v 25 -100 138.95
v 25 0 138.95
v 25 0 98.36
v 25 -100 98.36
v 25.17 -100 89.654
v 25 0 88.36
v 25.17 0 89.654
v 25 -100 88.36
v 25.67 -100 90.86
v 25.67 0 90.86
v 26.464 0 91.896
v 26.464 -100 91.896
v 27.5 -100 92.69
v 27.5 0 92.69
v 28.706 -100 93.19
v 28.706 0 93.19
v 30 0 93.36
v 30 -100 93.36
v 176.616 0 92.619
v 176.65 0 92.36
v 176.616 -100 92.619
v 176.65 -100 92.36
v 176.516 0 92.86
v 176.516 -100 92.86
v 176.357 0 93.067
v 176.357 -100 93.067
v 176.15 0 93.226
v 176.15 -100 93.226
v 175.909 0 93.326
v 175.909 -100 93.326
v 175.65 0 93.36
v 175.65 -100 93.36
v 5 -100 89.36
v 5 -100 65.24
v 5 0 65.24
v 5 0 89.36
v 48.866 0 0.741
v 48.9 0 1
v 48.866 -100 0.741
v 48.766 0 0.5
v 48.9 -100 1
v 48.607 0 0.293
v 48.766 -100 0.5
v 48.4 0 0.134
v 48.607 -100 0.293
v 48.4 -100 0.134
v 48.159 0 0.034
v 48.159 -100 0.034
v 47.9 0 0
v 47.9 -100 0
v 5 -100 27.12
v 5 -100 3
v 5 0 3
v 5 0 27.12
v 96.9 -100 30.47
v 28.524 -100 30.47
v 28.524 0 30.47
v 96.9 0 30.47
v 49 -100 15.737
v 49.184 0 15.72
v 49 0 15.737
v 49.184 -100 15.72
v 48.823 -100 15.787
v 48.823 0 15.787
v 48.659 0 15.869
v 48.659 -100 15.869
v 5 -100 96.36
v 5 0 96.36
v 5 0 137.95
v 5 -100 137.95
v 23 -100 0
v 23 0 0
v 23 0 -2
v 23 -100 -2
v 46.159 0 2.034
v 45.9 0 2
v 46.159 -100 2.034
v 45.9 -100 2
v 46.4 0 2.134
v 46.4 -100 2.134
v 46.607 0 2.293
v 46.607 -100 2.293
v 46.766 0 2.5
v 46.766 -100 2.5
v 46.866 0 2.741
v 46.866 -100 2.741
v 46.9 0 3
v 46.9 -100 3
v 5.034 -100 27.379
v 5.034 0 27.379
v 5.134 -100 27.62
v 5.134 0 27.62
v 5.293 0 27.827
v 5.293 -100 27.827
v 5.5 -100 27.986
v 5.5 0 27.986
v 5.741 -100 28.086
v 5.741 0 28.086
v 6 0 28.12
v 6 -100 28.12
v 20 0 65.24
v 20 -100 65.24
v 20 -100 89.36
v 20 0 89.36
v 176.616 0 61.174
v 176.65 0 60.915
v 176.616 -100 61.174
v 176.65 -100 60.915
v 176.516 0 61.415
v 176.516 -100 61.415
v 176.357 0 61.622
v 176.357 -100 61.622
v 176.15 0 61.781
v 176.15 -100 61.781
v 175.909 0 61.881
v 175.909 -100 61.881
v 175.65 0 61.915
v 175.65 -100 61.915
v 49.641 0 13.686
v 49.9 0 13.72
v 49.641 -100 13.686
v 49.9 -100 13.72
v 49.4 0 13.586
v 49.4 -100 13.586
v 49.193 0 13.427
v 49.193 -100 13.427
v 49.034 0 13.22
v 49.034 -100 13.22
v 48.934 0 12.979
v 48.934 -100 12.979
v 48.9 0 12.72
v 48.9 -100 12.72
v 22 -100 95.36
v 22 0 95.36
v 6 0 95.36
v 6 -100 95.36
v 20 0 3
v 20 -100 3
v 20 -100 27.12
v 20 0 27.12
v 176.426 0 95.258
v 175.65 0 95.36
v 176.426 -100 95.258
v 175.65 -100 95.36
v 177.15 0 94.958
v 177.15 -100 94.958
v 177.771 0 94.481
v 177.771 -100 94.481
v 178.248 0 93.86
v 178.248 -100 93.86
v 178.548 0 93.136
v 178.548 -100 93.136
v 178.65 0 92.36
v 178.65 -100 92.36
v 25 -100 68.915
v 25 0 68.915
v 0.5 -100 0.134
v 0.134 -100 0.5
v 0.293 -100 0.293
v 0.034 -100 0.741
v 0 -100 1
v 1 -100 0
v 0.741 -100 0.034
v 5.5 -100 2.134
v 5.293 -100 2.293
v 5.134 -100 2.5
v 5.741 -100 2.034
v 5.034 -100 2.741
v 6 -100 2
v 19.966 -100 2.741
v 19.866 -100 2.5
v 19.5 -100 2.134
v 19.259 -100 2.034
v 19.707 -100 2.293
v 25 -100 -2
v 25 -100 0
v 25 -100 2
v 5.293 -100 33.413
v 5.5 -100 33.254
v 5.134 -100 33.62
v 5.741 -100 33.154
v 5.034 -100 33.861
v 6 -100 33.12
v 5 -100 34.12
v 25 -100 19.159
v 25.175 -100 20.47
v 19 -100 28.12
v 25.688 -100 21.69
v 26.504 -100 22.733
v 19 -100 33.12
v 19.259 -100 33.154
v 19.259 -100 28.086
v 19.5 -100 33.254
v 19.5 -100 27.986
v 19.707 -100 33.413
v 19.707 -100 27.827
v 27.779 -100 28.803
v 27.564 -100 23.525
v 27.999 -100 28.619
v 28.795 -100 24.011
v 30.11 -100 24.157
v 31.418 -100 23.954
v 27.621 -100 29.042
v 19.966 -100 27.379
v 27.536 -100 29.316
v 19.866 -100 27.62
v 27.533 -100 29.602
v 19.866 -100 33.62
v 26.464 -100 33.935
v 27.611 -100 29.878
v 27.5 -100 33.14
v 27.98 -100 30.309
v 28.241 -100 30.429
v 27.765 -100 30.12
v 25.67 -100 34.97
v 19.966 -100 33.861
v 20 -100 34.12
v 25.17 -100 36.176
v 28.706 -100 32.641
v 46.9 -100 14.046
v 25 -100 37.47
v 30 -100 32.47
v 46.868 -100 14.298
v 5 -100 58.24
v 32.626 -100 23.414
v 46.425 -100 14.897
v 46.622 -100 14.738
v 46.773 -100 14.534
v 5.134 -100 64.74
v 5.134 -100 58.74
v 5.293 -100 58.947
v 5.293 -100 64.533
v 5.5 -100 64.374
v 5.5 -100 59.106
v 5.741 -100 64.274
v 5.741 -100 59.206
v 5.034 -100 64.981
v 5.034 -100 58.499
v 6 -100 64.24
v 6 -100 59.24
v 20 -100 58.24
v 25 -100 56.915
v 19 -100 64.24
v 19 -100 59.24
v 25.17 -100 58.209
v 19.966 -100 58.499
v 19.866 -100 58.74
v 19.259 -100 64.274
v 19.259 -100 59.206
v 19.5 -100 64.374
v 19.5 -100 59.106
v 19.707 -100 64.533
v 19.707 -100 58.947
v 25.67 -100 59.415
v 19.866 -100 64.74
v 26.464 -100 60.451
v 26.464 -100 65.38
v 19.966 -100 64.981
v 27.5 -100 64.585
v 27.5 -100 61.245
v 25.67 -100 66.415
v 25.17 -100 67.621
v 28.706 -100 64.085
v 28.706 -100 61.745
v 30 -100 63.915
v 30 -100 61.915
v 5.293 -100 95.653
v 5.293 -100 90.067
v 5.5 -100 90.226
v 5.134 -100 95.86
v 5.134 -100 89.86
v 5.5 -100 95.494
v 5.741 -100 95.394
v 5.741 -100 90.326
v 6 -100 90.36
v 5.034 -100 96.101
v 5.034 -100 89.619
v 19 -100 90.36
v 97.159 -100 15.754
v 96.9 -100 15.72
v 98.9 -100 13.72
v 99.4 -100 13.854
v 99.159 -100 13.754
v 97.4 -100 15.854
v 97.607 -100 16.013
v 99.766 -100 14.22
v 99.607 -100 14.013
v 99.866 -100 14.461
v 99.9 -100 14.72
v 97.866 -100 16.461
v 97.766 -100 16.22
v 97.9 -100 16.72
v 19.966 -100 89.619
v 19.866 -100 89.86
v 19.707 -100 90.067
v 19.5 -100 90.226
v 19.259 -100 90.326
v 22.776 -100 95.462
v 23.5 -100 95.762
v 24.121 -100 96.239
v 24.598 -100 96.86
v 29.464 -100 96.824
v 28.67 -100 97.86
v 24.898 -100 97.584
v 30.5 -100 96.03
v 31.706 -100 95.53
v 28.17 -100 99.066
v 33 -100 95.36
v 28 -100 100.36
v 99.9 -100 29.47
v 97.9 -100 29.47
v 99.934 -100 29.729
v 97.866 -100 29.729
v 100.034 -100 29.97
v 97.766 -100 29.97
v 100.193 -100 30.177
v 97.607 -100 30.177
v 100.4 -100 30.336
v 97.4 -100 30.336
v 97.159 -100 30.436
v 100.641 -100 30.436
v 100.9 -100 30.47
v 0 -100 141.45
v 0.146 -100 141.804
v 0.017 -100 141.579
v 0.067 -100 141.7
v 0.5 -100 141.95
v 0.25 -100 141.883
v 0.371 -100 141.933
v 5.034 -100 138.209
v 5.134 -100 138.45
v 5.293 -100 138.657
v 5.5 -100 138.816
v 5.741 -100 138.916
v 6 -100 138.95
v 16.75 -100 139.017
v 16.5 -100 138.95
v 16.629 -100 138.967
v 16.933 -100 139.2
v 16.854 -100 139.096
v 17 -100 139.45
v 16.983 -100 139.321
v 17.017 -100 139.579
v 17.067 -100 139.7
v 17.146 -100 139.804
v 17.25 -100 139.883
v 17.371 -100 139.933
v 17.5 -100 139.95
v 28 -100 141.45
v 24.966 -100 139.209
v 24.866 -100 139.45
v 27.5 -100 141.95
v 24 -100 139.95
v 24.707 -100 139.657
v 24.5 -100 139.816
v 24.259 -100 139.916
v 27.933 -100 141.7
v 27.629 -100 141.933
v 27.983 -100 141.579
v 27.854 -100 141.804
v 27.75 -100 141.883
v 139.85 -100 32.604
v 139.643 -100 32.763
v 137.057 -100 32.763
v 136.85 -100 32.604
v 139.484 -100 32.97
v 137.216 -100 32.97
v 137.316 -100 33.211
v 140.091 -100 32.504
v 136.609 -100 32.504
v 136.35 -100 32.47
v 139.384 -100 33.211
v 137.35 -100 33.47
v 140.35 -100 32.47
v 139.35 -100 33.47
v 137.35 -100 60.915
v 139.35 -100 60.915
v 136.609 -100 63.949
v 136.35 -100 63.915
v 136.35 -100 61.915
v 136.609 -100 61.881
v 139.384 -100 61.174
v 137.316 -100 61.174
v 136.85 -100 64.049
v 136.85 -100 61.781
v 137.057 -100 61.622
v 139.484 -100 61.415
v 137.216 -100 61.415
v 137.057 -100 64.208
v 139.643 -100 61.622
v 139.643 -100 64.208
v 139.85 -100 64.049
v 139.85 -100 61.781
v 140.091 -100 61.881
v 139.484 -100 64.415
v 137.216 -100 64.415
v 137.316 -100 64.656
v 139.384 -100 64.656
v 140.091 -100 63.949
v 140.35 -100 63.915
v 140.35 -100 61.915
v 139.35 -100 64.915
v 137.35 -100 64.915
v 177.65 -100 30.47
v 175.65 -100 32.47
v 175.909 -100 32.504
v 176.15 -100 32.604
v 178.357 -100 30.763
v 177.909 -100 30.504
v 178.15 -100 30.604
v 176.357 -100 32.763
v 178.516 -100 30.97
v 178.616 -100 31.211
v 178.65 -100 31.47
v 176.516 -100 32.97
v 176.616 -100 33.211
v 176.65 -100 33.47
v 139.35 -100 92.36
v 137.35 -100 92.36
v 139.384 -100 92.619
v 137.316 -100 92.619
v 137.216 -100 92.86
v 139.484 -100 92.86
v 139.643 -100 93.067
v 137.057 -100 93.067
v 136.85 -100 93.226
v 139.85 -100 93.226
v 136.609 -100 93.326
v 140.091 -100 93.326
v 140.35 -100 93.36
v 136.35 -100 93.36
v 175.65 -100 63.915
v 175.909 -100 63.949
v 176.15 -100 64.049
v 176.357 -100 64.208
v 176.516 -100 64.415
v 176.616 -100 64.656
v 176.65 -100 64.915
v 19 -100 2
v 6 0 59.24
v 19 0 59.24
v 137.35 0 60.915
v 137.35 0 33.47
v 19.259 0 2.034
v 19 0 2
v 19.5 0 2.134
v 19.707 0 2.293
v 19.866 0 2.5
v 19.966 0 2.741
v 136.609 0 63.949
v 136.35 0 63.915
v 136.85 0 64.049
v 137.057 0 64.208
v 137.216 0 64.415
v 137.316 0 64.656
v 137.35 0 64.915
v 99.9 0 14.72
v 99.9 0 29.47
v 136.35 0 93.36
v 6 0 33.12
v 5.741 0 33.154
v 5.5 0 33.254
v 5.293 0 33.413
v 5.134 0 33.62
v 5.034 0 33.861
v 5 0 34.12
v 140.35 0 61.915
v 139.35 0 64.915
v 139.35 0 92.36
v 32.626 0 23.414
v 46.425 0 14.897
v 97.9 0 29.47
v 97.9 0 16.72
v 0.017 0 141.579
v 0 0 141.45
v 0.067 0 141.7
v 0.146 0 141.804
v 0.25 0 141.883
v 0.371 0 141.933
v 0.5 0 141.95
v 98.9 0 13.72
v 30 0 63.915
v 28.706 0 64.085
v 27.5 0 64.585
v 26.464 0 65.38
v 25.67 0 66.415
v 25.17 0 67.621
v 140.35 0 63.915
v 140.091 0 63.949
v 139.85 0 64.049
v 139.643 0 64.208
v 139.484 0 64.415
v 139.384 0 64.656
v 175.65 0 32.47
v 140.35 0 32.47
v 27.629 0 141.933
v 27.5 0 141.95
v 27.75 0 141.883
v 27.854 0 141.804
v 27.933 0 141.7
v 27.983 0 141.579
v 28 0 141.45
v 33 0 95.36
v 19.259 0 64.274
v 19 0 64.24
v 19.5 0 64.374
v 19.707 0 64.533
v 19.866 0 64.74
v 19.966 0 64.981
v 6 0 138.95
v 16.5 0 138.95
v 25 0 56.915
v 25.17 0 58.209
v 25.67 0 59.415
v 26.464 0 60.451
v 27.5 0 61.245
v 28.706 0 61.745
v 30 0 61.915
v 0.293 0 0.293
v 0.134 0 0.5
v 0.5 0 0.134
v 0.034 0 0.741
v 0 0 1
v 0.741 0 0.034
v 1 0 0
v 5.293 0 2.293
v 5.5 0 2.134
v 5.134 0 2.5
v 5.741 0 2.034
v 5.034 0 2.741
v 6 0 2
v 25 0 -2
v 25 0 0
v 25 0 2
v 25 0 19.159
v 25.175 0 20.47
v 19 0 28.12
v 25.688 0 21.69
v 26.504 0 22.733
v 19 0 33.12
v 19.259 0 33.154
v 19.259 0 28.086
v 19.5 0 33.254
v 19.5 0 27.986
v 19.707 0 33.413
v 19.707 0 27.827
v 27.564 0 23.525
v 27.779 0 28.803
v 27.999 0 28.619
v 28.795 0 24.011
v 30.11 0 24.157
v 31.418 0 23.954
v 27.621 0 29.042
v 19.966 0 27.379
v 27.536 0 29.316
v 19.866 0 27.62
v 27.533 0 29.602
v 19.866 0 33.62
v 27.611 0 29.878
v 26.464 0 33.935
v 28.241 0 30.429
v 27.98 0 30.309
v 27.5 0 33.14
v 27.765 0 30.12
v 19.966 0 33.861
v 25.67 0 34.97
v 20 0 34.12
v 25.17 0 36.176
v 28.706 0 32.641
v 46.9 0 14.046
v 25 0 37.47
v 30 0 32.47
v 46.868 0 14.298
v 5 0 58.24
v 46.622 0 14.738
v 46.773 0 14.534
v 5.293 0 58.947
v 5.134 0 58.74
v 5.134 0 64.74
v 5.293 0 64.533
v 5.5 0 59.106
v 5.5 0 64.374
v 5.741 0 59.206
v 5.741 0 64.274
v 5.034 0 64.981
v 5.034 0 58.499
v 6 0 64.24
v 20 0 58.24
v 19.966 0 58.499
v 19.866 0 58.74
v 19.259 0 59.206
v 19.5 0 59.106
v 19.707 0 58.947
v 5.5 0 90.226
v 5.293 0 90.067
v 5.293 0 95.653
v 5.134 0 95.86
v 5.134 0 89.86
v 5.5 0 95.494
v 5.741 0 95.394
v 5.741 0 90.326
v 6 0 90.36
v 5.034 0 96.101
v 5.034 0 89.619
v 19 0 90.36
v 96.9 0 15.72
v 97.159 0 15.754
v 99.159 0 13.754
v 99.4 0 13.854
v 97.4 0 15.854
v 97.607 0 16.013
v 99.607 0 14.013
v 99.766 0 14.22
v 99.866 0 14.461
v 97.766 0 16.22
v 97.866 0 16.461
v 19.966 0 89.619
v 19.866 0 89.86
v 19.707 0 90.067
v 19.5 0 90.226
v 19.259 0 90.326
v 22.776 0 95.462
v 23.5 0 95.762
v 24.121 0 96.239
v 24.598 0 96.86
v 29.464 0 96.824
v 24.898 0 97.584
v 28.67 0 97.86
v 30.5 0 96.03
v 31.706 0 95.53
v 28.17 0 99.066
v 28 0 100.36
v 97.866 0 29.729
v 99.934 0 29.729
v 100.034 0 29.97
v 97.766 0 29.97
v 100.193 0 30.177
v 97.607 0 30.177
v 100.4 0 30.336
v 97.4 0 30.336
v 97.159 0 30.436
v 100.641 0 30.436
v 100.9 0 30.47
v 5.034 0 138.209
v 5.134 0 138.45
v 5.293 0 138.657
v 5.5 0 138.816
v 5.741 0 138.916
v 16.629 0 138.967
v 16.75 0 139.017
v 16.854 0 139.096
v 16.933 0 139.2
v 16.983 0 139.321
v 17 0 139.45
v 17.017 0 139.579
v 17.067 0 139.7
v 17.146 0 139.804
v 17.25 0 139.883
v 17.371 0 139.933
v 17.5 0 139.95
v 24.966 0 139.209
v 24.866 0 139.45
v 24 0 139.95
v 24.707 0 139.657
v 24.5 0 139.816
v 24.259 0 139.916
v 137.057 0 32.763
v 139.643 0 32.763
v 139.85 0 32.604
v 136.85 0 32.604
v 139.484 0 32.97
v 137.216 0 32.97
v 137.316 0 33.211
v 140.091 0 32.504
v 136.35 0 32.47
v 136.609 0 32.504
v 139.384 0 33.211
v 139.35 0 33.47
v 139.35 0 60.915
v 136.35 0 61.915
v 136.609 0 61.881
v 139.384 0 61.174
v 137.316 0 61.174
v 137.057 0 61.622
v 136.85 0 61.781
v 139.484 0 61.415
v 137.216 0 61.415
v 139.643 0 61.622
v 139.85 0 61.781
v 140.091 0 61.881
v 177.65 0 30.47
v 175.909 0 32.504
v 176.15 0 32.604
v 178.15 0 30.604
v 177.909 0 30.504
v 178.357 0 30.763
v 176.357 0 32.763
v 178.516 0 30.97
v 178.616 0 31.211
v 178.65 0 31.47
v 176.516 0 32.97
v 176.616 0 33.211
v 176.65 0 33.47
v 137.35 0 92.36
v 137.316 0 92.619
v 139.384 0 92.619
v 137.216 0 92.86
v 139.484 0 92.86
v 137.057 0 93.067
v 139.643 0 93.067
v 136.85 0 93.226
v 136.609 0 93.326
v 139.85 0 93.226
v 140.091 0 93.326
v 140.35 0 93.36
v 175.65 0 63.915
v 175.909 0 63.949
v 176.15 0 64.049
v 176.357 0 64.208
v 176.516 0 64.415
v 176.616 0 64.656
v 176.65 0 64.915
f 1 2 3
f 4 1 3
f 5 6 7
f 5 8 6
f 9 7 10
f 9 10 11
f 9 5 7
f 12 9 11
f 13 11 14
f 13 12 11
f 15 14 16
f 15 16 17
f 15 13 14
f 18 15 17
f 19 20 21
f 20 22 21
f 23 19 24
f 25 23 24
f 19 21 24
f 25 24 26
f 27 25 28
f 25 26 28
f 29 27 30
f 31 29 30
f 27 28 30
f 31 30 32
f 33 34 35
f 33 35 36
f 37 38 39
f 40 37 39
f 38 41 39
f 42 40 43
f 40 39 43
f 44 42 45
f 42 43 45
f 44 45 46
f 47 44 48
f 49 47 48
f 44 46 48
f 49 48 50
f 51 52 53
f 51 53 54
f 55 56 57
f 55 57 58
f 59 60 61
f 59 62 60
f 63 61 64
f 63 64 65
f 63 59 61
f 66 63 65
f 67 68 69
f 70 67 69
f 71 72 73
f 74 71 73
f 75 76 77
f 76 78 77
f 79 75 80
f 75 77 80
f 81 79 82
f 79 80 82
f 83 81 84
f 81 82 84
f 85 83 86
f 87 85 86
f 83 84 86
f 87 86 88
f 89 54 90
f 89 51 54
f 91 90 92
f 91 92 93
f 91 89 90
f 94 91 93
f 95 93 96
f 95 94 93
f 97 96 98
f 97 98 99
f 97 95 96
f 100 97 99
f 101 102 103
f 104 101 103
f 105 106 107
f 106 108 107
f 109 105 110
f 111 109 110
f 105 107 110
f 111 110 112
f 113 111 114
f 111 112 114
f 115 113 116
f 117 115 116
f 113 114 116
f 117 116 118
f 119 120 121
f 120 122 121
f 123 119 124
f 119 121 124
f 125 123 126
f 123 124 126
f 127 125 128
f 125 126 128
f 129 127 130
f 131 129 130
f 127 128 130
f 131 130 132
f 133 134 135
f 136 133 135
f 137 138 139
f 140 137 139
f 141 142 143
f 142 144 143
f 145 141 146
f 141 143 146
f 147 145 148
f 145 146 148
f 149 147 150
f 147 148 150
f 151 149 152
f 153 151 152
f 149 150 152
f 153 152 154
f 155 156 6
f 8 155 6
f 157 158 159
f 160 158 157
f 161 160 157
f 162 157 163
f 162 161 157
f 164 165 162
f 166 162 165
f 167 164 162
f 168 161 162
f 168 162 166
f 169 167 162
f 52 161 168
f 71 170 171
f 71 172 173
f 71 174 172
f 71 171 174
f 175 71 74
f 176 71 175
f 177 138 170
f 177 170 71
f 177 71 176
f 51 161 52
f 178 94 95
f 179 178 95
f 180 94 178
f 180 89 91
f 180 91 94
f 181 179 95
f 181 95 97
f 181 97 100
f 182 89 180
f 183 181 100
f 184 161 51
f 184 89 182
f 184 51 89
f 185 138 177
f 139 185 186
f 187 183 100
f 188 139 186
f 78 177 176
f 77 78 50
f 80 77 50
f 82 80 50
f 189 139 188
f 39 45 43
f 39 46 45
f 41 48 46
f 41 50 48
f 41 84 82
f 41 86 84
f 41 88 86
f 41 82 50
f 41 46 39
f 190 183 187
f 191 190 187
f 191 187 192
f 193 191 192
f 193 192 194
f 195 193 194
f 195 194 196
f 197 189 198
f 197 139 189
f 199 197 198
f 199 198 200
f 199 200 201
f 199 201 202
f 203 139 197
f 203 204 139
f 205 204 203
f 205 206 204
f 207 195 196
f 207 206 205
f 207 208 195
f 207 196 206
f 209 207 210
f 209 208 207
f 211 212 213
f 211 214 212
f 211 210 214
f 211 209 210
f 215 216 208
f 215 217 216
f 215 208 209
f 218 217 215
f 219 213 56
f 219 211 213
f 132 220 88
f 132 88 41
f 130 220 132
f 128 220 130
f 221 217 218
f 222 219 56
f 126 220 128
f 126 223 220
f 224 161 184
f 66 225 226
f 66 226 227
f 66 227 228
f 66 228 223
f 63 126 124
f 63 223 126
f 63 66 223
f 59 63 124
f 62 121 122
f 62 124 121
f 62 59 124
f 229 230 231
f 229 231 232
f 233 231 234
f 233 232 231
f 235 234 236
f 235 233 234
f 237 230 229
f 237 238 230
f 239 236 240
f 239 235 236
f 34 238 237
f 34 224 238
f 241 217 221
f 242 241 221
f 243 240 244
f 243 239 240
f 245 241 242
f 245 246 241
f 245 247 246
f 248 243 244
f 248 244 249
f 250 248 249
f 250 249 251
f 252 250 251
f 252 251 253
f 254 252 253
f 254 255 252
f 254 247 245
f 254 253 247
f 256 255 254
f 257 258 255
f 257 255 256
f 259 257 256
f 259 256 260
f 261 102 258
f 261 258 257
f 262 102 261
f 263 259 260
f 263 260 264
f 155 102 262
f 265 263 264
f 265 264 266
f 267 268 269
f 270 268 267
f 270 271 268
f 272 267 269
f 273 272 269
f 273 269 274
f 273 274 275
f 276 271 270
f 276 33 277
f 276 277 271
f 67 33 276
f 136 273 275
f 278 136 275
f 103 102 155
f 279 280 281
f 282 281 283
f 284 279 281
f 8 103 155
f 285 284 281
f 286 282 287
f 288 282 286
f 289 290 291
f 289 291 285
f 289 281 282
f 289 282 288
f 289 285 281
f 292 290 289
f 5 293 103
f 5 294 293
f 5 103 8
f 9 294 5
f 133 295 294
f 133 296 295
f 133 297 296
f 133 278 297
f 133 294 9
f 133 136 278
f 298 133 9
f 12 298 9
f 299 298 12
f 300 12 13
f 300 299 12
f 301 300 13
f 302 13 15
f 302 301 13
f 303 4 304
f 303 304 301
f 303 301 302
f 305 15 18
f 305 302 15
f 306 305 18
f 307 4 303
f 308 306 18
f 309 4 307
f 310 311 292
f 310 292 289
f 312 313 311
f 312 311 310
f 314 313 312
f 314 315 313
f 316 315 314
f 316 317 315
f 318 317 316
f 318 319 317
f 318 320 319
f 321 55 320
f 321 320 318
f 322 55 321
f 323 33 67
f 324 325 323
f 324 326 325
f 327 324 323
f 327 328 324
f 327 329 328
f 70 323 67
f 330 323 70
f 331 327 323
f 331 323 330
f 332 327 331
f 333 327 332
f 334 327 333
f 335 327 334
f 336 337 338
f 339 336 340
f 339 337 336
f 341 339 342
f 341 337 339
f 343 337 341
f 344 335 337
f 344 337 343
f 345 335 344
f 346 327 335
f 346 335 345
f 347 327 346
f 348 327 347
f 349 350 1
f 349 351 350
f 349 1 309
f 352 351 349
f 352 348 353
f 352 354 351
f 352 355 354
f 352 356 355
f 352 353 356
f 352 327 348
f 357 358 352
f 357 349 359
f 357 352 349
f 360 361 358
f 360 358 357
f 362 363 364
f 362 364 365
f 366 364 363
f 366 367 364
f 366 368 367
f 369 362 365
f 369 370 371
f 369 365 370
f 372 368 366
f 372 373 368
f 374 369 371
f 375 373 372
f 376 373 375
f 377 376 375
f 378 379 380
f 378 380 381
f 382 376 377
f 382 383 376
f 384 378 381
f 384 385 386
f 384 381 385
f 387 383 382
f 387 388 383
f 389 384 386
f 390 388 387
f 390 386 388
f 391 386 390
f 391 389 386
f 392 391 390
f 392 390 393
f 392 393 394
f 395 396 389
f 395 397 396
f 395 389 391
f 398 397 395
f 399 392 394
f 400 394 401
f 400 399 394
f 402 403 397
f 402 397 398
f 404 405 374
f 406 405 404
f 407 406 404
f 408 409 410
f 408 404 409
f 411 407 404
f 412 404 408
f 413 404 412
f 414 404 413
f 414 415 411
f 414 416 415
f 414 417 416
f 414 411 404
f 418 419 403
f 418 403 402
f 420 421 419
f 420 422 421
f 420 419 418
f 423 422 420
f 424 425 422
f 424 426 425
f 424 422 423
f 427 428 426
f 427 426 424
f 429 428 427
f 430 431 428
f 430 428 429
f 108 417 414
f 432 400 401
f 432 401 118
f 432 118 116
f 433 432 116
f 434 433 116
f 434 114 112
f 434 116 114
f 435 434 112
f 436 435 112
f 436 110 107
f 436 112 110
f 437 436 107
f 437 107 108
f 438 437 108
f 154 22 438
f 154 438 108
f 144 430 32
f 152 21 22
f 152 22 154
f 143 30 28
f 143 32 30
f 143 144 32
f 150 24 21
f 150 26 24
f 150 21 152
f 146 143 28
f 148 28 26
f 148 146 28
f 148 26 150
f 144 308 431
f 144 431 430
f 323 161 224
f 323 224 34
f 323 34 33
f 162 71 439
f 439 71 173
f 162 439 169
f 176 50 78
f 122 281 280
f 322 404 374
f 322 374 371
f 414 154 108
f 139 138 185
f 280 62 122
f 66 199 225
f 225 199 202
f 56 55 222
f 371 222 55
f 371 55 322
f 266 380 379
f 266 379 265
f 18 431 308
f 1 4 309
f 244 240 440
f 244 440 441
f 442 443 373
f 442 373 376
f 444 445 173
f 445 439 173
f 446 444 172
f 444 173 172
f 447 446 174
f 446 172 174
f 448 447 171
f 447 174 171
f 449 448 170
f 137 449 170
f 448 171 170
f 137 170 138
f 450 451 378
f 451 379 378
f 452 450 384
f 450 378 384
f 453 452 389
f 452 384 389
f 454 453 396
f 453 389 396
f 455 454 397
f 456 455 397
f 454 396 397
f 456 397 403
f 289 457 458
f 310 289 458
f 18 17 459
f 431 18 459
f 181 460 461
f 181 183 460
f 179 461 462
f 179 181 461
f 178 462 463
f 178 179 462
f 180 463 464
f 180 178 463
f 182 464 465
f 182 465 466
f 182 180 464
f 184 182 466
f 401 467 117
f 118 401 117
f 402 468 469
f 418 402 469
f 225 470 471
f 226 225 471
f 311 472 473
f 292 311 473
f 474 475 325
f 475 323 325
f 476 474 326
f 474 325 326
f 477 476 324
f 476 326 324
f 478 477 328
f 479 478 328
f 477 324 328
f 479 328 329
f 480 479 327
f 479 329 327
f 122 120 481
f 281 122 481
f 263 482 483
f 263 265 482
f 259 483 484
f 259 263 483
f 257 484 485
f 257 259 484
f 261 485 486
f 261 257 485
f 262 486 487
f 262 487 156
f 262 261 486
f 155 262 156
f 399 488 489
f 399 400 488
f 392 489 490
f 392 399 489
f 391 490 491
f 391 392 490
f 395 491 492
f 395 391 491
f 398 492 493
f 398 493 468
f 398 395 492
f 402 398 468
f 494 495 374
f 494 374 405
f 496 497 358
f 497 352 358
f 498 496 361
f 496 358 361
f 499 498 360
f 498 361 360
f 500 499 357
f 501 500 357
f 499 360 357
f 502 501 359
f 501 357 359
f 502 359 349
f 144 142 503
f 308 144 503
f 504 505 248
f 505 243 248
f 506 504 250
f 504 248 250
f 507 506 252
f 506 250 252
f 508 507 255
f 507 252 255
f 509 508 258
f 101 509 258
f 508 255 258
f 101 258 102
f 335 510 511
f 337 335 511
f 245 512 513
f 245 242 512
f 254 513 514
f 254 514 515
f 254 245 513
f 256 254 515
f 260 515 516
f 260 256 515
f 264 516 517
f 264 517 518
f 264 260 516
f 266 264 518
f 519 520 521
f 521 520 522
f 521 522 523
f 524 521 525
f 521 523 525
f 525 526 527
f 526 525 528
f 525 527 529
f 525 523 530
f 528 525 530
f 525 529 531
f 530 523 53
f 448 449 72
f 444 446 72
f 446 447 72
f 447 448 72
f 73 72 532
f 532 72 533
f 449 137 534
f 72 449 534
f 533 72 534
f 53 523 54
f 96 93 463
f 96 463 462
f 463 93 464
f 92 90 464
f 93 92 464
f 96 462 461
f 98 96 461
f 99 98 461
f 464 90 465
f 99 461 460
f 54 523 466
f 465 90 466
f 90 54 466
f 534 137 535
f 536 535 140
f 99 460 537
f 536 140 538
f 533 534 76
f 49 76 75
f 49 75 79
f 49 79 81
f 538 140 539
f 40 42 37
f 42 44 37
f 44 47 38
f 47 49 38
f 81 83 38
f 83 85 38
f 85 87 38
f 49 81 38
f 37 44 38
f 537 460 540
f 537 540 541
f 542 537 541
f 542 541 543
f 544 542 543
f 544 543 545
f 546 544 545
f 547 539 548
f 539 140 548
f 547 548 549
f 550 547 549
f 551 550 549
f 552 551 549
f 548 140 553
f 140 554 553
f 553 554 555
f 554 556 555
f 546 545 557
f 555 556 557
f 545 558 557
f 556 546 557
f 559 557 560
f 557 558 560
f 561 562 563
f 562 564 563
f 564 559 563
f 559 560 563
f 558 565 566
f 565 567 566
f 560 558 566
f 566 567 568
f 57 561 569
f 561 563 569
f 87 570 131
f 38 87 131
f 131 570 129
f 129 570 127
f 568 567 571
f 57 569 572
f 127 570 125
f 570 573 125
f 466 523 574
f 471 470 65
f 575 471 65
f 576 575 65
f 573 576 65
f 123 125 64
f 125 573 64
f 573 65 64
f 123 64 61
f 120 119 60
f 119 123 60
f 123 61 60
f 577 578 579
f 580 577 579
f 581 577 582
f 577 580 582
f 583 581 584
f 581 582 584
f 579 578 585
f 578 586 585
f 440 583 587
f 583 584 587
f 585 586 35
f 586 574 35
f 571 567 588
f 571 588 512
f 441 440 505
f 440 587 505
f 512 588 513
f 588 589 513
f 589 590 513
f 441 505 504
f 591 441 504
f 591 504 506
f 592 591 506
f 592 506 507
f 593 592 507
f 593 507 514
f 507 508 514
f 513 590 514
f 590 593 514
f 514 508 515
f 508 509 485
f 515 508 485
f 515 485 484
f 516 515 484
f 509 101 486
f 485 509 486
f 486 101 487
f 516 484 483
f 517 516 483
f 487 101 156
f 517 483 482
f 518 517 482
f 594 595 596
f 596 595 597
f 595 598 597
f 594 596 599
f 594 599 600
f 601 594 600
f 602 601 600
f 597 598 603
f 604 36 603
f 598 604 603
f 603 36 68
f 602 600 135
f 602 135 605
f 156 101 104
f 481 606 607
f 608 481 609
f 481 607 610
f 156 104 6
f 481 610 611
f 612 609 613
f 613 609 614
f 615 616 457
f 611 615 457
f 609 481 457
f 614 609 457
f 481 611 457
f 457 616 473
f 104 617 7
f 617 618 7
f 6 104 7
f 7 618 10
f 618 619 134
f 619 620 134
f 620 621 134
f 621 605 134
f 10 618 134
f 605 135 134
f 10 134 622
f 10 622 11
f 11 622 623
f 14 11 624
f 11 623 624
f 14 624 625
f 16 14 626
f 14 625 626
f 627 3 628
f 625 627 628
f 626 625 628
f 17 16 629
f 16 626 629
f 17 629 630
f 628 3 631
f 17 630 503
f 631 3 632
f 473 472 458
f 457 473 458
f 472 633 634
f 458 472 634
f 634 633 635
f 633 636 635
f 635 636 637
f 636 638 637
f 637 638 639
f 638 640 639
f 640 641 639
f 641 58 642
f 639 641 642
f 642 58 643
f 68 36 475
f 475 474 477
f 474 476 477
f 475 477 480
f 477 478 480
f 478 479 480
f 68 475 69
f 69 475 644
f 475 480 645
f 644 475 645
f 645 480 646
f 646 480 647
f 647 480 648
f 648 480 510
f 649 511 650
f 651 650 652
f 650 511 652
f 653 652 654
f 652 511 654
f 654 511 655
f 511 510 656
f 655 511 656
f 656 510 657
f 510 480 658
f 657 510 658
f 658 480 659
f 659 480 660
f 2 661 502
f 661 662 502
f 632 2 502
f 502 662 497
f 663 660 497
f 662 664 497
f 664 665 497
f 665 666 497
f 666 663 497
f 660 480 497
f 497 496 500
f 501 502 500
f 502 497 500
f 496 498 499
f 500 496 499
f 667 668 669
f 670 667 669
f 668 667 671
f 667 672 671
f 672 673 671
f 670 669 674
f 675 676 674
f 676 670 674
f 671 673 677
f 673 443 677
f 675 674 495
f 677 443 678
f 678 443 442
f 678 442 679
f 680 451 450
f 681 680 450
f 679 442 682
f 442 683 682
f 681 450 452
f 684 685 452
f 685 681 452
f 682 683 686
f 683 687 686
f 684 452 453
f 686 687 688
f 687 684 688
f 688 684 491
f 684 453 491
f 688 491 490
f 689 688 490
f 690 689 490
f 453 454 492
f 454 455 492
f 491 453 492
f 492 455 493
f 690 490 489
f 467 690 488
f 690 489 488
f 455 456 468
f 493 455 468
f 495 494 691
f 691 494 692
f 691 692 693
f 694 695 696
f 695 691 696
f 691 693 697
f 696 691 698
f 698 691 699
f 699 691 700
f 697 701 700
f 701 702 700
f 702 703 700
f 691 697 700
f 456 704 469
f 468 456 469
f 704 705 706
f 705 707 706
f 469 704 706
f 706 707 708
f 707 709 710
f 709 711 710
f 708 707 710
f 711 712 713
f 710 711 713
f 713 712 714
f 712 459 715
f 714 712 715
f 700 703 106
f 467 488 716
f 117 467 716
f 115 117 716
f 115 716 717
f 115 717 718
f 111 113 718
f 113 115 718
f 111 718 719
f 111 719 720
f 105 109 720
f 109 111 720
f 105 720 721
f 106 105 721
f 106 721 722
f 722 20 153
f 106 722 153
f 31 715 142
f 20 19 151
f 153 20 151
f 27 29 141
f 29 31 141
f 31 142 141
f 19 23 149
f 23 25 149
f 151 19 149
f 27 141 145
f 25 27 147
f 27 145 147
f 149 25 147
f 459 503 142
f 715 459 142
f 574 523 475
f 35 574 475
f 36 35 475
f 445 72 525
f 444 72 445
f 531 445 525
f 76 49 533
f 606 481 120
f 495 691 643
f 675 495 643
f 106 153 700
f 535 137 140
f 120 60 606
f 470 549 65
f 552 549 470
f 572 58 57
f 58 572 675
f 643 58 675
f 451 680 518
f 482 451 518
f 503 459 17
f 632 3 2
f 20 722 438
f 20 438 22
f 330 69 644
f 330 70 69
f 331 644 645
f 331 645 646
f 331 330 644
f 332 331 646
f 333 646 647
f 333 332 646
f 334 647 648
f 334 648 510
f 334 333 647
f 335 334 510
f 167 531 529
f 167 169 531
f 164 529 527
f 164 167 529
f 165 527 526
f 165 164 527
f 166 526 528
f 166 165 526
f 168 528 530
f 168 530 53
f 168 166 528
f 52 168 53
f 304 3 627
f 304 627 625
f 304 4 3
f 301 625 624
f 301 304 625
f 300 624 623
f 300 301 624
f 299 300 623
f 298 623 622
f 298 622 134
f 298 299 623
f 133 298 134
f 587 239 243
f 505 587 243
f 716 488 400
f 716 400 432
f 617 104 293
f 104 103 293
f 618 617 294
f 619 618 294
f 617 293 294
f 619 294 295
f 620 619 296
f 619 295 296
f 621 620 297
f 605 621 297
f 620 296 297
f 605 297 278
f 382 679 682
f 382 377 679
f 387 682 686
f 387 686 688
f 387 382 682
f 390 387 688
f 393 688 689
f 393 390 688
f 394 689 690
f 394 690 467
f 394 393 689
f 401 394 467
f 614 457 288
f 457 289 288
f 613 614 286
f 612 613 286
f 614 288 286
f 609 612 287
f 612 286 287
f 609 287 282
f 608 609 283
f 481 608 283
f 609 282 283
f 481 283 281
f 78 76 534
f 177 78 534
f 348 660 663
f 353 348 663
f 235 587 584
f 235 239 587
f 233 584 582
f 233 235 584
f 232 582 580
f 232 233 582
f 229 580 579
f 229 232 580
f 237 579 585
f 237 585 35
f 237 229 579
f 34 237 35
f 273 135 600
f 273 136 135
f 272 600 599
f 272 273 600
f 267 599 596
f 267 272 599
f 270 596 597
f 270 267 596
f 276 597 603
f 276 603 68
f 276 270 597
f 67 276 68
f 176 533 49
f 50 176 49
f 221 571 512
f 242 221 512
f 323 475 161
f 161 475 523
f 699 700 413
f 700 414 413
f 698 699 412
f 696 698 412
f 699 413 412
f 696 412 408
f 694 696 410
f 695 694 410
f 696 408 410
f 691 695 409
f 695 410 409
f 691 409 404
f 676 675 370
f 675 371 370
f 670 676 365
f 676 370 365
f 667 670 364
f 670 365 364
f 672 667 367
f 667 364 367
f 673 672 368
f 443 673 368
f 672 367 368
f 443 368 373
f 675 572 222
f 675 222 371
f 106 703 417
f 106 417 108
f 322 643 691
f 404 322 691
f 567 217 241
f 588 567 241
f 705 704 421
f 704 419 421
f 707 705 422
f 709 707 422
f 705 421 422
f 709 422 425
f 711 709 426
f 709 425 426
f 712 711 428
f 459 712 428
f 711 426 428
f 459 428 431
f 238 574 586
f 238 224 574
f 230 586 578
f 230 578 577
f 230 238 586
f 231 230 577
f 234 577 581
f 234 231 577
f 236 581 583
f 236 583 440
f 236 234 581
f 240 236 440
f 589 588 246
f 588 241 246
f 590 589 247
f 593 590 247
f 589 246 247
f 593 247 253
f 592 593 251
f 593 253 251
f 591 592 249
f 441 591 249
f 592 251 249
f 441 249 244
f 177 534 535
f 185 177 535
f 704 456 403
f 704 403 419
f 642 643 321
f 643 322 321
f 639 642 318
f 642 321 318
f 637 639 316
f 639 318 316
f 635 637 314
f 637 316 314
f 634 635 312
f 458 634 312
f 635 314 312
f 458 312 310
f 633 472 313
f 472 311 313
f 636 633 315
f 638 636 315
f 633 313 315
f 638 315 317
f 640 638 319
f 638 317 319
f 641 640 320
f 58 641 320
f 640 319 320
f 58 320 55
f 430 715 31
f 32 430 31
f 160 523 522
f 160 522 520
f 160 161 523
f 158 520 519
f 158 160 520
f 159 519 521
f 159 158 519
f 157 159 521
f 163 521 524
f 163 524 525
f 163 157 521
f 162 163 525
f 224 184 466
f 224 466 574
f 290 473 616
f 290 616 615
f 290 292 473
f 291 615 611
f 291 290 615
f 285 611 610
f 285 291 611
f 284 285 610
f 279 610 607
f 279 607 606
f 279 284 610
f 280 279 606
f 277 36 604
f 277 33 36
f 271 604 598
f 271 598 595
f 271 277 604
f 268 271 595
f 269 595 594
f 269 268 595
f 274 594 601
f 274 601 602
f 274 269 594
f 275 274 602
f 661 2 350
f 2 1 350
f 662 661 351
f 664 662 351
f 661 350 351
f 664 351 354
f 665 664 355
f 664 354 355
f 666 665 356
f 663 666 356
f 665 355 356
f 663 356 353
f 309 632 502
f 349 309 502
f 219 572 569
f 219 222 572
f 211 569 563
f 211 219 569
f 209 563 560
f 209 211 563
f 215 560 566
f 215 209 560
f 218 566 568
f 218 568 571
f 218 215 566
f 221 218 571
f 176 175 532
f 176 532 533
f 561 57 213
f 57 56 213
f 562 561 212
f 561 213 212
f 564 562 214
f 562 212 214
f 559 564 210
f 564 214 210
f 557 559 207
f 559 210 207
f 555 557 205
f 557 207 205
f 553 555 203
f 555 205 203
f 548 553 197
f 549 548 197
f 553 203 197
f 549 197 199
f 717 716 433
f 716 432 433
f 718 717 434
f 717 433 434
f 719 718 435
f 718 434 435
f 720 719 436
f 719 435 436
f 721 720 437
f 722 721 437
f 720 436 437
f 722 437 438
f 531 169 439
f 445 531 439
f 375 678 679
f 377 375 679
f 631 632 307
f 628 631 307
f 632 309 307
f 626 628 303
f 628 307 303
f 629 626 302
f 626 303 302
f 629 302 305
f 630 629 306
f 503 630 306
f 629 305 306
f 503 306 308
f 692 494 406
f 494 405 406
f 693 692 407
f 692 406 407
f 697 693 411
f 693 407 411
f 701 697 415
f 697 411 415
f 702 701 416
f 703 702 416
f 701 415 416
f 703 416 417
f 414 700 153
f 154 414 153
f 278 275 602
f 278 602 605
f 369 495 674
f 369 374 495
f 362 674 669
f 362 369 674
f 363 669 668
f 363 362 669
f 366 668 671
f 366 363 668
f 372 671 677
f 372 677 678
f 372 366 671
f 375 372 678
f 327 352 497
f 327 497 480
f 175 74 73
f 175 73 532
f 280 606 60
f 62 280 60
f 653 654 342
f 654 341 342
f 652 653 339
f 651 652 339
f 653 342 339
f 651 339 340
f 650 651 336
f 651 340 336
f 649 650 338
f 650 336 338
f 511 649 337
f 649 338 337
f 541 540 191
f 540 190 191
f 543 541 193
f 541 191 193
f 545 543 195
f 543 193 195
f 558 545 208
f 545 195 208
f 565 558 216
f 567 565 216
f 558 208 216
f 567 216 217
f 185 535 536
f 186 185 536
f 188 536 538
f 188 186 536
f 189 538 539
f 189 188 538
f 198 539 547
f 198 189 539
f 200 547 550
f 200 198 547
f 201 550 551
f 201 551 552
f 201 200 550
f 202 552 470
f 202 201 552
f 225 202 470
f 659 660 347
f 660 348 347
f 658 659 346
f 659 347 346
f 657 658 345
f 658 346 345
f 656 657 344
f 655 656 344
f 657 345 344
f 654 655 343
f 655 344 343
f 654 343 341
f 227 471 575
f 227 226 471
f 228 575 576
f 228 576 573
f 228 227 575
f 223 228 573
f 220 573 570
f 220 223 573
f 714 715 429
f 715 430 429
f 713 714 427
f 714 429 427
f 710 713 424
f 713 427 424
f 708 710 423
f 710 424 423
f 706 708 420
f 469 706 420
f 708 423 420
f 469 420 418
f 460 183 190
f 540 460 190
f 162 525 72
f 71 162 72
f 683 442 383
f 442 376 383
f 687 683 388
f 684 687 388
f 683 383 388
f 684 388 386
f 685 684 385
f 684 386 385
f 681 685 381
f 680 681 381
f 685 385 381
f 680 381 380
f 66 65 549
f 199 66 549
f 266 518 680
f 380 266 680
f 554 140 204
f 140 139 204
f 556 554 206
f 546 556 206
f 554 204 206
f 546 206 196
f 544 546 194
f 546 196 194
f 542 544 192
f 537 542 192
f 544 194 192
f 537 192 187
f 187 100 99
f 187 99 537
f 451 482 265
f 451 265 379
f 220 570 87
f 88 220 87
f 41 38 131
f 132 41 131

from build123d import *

# Parameters (mm, degrees)
F0_W     = 15
F0_H     = 26.12
F0_W_2   = 112.35
F0_H_2   = 29.4448914682
F0_W_3   = 37.3
F1_DEPTH = 100
F2_R     = 5
F3_R     = 1
F4_R     = 0.49999
F5_R     = 3


# Not quite as in the source:
# - two fillets or chamfers of one size are made in one step
# - a fillet or chamfer is up to 0.001 mm smaller than in the source, because OpenCascade refuses the exact size
# - a feature names something its author has since deleted; it is built from what else it names


with BuildPart() as f1:
    # F0 (on Front) → F1 (new body)
    with BuildSketch(Plane.XZ):
        Polygon((0, 141.95), (0, 0), (23, 0), (23, -2), (25, -2), (25, 0), (48.9, 0), (48.9, 13.7202170637), (99.9, 13.7202170637), (99.9, 30.4702170637), (178.65, 30.4702170637), (178.65, 95.36), (28, 95.36), (28, 141.95), align=None)
        with Locations((12.5, 15.06)):
            Rectangle(F0_W, F0_H, mode=Mode.SUBTRACT)
        Polygon((25, 2), (25, 28.12), (46.9, 14.6043096234), (46.9, 2), align=None, mode=Mode.SUBTRACT)
        Polygon((97.9, 15.7202170637), (48.9, 15.7202170637), (25, 30.4702170637), (97.9, 30.4702170637), align=None, mode=Mode.SUBTRACT)
        with Locations((12.5, 46.18)):
            Rectangle(F0_W, F0_H, mode=Mode.SUBTRACT)
        with Locations((81.175, 47.1926627978)):
            Rectangle(F0_W_2, F0_H_2, mode=Mode.SUBTRACT)
        with Locations((158, 47.1926627978)):
            Rectangle(F0_W_3, F0_H_2, mode=Mode.SUBTRACT)
        with Locations((12.5, 77.3)):
            Rectangle(F0_W, F0_H, mode=Mode.SUBTRACT)
        with Locations((81.175, 78.6375542659)):
            Rectangle(F0_W_2, F0_H_2, mode=Mode.SUBTRACT)
        Polygon((25, 95.36), (5, 95.36), (5, 138.95), (17, 138.95), (17, 139.95), (25, 139.95), align=None, mode=Mode.SUBTRACT)
        with Locations((158, 78.6375542659)):
            Rectangle(F0_W_3, F0_H_2, mode=Mode.SUBTRACT)
    extrude(amount=F1_DEPTH)

    # F2
    f2_edges = [f1.edges().sort_by_distance(p)[0] for p in [
        (28, -50, 95.36),
        (25, -50, 28.12),
        (25, -50, 32.470217),
        (25, -50, 61.915109),
        (25, -50, 93.36),
        (25, -50, 63.915109),
    ]]
    fillet(f2_edges, radius=F2_R)

    # F3
    f3_edges = [f1.edges().sort_by_distance(p)[0] for p in [
        (5, -50, 64.24),
        (5, -50, 33.12),
        (5, -50, 2),
        (5, -50, 90.36),
        (5, -50, 59.24),
        (5, -50, 28.12),
        (20, -50, 28.12),
        (20, -50, 59.24),
        (20, -50, 90.36),
        (20, -50, 64.24),
        (20, -50, 33.12),
        (20, -50, 2),
        (46.9, -50, 2),
        (46.9, -50, 14.60431),
        (25, -50, 30.470217),
        (97.9, -50, 15.720217),
        (97.9, -50, 30.470217),
        (137.35, -50, 61.915109),
        (137.35, -50, 93.36),
        (137.35, -50, 63.915109),
        (137.35, -50, 32.470217),
        (176.65, -50, 32.470217),
        (176.65, -50, 63.915109),
        (139.35, -50, 63.915109),
        (139.35, -50, 61.915109),
        (139.35, -50, 93.36),
        (176.65, -50, 93.36),
        (176.65, -50, 61.915109),
        (139.35, -50, 32.470217),
        (99.9, -50, 30.470217),
        (48.9, -50, 13.720217),
        (48.9, -50, 0),
        (0, -50, 0),
        (48.9, -50, 15.720217),
        (99.9, -50, 13.720217),
        (178.65, -50, 30.470217),
        (25, -50, 139.95),
        (5, -50, 95.36),
        (5, -50, 138.95),
    ]]
    fillet(f3_edges, radius=F3_R)

    # F4 (radius 0.5 in the source; OpenCascade refuses exactly that, so slightly less here)
    f4_edges = [f1.edges().sort_by_distance(p)[0] for p in [
        (0, -50, 141.95),
        (28, -50, 141.95),
        (17, -50, 139.95),
        (17, -50, 138.95),
    ]]
    fillet(f4_edges, radius=F4_R)

    # F5
    f5_edges = [f1.edges().sort_by_distance(p)[0] for p in [
        (178.65, -50, 95.36),
        (25, -50, 95.36),
    ]]
    fillet(f5_edges, radius=F5_R)


solid = f1.part
